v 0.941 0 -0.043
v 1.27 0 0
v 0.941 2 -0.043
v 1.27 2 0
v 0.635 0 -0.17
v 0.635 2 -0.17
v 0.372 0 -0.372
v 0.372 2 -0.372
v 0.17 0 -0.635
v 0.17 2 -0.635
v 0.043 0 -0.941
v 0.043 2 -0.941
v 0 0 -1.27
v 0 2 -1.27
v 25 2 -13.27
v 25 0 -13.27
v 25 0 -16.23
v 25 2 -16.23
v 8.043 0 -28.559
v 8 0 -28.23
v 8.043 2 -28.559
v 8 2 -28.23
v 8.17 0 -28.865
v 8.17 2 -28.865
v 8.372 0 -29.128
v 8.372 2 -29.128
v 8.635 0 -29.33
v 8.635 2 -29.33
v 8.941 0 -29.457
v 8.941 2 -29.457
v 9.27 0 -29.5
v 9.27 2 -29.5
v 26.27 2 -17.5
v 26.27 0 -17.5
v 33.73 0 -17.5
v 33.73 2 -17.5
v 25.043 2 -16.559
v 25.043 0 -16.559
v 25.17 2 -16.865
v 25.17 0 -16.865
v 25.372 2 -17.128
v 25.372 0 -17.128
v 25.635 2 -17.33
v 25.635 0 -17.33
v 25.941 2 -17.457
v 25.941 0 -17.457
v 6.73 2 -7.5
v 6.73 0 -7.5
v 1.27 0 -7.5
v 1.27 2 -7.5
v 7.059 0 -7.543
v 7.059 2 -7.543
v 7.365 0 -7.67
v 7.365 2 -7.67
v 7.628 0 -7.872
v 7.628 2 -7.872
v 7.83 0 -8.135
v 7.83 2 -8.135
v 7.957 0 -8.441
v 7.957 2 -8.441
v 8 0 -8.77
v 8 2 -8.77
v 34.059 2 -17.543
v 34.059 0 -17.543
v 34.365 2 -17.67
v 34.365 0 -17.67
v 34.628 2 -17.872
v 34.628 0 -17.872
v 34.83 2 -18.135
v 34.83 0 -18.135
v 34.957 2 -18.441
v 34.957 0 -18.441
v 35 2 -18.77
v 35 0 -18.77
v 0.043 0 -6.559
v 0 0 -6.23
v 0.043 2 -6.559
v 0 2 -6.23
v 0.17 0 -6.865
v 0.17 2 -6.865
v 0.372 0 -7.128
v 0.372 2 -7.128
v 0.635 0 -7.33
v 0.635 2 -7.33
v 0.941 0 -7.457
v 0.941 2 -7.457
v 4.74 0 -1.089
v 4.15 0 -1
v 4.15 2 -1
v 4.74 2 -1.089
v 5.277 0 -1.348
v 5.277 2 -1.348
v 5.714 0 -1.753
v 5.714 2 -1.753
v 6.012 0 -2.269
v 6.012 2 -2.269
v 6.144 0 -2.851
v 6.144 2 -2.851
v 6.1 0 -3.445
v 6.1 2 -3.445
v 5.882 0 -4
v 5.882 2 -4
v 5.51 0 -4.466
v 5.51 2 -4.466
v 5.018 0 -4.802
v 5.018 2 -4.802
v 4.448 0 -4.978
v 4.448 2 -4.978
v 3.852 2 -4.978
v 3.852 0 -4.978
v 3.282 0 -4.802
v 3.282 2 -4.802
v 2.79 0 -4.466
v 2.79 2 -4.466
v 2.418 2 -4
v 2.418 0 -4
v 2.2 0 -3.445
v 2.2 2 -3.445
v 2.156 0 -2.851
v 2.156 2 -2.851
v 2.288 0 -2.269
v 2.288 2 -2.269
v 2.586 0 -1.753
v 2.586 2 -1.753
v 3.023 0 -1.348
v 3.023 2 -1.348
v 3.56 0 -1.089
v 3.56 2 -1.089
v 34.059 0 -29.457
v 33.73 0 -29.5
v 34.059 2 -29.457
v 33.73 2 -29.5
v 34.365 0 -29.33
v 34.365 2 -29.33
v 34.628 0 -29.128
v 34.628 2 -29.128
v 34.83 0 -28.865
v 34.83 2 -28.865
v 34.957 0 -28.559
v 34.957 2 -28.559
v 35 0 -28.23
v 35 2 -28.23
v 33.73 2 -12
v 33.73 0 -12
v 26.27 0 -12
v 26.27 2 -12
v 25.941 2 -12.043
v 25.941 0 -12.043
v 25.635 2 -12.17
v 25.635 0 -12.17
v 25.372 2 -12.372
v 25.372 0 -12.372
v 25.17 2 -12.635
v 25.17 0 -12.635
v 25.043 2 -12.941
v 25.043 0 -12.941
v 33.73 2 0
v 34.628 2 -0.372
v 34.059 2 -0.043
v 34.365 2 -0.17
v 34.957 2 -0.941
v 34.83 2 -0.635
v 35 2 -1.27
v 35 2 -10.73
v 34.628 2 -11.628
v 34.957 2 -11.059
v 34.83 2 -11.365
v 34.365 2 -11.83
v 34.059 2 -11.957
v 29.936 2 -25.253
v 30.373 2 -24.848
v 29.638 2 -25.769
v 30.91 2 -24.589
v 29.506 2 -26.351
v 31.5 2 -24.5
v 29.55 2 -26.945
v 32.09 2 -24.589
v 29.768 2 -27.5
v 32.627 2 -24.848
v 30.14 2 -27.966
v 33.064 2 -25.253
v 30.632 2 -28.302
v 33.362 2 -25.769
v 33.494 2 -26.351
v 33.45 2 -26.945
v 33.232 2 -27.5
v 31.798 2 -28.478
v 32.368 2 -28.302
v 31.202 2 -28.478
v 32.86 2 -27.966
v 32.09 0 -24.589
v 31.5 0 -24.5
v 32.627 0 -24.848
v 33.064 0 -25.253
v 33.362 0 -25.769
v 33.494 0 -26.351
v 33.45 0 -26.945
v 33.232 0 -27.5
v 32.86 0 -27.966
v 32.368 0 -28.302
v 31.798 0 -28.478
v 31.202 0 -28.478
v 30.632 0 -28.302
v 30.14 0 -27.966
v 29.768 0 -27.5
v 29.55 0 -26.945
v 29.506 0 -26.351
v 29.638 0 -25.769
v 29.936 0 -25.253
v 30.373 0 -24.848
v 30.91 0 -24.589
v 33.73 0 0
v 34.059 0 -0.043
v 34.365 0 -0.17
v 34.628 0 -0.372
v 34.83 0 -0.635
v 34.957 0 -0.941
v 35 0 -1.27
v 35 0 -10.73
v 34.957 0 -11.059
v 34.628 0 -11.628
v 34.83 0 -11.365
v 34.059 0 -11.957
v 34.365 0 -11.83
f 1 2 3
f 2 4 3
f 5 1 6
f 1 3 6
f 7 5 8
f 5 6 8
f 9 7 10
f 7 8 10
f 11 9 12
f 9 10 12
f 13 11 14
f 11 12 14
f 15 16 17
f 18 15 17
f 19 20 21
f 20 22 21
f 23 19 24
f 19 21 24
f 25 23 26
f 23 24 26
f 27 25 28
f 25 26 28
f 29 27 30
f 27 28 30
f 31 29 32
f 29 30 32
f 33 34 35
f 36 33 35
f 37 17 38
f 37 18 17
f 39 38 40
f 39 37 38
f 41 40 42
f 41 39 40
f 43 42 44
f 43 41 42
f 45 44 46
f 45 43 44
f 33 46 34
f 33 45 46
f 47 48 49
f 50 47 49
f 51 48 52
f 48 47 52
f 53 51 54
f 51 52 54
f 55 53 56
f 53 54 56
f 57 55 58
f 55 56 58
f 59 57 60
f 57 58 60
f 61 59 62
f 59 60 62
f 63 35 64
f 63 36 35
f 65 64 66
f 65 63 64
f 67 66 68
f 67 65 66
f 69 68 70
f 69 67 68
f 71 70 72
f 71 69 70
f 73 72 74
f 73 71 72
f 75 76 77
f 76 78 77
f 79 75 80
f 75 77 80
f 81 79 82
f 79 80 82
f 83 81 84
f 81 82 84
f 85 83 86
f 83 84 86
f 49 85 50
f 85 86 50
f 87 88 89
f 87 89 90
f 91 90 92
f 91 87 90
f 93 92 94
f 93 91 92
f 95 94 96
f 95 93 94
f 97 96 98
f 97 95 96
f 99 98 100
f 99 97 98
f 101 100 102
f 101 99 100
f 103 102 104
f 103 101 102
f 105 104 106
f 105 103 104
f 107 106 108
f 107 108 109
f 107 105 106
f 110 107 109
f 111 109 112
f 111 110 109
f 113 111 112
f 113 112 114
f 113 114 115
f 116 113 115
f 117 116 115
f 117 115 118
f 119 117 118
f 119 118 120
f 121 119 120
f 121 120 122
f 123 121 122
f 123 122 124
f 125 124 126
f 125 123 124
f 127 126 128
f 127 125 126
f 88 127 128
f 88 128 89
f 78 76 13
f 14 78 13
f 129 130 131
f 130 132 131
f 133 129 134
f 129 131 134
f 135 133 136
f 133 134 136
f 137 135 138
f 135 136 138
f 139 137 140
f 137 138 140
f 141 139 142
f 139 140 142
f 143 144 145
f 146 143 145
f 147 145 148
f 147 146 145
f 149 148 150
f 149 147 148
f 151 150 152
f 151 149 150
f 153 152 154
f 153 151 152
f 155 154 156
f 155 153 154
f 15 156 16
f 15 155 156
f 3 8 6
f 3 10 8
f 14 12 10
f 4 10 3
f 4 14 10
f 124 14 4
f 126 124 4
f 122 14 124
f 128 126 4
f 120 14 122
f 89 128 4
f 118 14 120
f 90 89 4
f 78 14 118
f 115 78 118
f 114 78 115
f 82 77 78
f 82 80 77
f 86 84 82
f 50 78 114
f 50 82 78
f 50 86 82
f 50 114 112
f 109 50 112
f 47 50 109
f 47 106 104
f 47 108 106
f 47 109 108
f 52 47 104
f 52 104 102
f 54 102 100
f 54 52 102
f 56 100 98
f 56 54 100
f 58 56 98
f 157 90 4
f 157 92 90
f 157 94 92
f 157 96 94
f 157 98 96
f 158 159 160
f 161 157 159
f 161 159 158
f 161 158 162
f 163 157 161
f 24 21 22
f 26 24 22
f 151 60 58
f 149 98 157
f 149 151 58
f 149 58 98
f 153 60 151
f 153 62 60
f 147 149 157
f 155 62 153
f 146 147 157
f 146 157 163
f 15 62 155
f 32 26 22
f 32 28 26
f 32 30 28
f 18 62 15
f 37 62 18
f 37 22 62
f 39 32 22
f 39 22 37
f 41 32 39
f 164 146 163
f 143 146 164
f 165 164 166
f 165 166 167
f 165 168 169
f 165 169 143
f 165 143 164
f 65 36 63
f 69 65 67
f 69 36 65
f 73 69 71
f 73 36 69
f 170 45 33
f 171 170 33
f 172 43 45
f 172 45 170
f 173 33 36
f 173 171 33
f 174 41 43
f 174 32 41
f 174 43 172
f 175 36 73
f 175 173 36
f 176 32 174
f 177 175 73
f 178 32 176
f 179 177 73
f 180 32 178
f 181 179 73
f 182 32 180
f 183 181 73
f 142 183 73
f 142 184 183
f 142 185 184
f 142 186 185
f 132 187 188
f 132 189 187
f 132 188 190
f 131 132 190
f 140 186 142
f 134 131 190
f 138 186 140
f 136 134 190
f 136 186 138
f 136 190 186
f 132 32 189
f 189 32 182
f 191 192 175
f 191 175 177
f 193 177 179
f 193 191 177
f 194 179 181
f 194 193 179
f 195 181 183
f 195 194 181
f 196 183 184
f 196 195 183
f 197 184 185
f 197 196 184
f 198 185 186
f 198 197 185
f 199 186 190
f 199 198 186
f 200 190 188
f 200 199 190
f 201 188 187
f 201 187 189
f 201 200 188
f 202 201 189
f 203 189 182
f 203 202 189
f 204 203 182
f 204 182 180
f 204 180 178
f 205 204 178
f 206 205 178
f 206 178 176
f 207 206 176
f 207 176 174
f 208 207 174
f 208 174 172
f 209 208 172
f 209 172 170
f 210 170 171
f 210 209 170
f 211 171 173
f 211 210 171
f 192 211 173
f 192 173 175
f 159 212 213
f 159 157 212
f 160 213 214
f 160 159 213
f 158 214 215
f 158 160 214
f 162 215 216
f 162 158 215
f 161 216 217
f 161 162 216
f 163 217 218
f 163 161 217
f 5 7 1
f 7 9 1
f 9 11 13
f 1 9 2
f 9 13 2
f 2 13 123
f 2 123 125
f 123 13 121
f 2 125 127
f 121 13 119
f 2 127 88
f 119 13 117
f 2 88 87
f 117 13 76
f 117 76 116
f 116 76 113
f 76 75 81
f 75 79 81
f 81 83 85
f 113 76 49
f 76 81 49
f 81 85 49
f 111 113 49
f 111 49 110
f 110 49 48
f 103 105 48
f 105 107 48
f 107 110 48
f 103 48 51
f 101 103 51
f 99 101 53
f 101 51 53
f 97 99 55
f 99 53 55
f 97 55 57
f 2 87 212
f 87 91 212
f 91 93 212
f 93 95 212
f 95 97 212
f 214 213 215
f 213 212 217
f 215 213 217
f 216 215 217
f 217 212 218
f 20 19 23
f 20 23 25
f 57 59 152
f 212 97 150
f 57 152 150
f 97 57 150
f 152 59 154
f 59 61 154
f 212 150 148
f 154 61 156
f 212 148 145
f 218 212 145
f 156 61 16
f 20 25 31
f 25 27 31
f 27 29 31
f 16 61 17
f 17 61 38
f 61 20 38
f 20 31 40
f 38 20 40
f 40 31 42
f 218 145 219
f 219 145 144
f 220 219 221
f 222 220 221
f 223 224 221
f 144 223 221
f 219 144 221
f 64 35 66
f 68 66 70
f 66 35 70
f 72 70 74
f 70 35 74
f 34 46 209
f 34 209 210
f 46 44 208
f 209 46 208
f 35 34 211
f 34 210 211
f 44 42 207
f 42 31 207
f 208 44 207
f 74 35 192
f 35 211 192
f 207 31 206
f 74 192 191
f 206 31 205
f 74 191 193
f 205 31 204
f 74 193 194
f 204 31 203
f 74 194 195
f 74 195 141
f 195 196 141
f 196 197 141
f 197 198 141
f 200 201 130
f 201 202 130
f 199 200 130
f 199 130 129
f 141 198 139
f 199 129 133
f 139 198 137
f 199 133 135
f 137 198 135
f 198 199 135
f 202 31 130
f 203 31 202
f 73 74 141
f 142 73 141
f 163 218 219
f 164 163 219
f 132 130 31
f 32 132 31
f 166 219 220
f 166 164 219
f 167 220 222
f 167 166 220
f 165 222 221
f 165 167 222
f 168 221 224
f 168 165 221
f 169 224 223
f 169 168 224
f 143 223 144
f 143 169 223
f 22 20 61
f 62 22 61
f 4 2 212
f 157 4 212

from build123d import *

# Parameters (mm, degrees)
CROQUIS1_R              = 2
SALIENTE_EXTRUIR1_DEPTH = 2
REDONDEO5_R             = 1.27


with BuildPart() as part:
    # Croquis1 → Saliente-Extruir1 (new body)
    with BuildSketch(Plane(origin=(0, 0, 0), x_dir=(1, 0, 0), z_dir=(0, 1, 0))):
        Polygon((0, 0), (35, 0), (35, 12), (25, 12), (25, 17.5), (35, 17.5), (35, 29.5), (8, 29.5), (8, 7.5), (0, 7.5), align=None)
        with Locations(Location((4.15, 3, 0), (0, 0, 270))):
            Circle(CROQUIS1_R, mode=Mode.SUBTRACT)
        with Locations(Location((31.5, 26.5, 0), (0, 0, 270))):
            Circle(CROQUIS1_R, mode=Mode.SUBTRACT)
    extrude(amount=SALIENTE_EXTRUIR1_DEPTH)

    # Redondeo5
    redondeo5_edges = [part.edges().sort_by_distance(p)[0] for p in [
        (0, 1, -7.5),
        (8, 1, -7.5),
        (8, 1, -29.5),
        (35, 1, -29.5),
        (35, 1, -17.5),
        (25, 1, -17.5),
        (25, 1, -12),
        (35, 1, -12),
        (35, 1, 0),
        (0, 1, 0),
    ]]
    fillet(redondeo5_edges, radius=REDONDEO5_R)


solid = part.part
